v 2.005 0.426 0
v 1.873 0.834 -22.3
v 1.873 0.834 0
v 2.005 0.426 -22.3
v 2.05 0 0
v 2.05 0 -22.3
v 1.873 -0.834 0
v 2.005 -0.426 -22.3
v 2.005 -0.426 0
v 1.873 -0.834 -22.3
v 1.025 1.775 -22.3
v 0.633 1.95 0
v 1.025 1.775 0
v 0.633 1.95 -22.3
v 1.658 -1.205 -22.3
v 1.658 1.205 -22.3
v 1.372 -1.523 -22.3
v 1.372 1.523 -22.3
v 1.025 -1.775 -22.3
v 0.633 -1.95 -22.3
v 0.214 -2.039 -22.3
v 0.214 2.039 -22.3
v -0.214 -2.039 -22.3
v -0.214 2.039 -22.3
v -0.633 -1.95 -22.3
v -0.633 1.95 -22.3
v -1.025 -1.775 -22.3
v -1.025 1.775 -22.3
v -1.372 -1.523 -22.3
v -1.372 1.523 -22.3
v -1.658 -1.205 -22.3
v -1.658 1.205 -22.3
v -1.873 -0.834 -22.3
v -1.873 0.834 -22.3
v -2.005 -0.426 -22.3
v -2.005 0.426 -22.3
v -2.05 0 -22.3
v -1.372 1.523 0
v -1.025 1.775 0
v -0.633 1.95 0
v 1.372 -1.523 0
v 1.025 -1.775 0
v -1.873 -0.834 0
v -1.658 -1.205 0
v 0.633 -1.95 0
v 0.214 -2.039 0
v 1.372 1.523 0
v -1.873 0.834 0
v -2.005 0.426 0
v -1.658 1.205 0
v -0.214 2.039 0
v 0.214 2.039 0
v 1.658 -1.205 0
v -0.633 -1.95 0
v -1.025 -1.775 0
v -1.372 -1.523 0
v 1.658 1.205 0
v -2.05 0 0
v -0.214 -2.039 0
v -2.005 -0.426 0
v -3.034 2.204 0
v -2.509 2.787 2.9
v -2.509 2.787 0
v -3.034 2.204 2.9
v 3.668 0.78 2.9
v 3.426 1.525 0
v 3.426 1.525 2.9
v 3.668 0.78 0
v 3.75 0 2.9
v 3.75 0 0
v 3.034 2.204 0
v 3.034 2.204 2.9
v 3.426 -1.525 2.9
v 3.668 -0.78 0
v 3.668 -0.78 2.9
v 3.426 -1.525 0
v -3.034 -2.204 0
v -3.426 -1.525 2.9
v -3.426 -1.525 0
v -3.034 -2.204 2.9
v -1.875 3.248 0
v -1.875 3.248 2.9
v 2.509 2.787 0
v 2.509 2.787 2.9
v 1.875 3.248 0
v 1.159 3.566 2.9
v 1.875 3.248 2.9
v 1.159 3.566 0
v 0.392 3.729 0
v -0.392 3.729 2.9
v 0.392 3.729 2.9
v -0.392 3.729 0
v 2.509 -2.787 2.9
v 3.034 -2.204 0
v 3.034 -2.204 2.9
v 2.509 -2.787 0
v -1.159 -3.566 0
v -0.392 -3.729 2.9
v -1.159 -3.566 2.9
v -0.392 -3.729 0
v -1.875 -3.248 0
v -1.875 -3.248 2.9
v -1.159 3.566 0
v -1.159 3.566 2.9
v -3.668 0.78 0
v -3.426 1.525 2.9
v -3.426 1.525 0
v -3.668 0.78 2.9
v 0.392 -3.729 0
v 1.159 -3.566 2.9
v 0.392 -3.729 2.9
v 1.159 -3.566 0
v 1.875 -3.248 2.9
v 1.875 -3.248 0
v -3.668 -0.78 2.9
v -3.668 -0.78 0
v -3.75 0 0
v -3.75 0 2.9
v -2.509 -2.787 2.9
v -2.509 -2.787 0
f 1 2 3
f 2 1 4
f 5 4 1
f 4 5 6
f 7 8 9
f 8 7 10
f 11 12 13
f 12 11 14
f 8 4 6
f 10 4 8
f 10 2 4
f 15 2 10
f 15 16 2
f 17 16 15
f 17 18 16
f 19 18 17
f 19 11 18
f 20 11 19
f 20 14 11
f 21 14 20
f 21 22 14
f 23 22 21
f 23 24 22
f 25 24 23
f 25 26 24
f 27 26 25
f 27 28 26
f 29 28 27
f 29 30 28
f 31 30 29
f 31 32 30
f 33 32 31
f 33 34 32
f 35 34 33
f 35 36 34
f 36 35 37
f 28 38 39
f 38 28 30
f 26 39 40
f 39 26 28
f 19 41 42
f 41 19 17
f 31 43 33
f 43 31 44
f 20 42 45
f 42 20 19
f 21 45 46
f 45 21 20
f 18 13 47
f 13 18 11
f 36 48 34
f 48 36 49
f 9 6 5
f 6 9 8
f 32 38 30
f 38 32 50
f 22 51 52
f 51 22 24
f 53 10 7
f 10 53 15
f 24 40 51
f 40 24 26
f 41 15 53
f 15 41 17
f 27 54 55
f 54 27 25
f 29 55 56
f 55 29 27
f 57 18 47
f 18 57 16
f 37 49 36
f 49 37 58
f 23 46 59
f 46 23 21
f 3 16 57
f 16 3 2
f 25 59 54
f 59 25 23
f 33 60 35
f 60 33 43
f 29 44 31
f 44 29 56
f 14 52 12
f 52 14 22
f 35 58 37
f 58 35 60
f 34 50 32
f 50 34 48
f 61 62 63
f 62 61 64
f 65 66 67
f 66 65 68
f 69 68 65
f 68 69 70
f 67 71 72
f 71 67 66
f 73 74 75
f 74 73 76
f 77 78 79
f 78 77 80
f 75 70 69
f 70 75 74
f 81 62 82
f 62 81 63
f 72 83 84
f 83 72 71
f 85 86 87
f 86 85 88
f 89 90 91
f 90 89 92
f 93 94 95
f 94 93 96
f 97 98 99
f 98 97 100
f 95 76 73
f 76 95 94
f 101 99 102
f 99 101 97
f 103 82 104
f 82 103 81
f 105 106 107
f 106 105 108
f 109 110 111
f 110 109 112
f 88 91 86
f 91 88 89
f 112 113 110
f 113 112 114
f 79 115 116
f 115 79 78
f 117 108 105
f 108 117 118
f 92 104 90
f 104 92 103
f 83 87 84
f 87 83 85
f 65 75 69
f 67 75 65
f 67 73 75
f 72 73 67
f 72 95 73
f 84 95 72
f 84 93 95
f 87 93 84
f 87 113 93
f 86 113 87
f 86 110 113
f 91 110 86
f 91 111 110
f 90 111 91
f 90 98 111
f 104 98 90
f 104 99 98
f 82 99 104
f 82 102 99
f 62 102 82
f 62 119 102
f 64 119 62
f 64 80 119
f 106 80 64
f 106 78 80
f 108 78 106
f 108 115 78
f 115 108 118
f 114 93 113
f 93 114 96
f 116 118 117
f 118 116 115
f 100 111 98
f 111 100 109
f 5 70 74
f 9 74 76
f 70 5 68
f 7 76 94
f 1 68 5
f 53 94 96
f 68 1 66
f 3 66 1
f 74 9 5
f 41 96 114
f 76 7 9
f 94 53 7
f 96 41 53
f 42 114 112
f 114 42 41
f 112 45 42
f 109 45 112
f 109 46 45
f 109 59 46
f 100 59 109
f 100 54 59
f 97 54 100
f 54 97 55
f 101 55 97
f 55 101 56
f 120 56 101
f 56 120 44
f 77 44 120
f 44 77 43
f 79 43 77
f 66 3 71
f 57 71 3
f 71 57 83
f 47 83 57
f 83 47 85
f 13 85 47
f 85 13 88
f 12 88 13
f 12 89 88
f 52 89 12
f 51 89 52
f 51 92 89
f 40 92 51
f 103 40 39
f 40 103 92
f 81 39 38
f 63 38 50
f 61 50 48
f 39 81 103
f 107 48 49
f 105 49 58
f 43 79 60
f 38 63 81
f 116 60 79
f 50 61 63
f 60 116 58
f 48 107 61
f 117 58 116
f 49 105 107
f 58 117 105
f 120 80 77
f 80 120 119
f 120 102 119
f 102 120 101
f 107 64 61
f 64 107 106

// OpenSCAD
//This is modelling a plastic screw being used as a bolt, and it's got a thicker bit so that it can slide through one side of the grip and then grab onto the other

function HiLoBoltOuterDiameter(3dPrinterTolerance=.4) = 4.5 + 3dPrinterTolerance*2;
function HiLoBoltDiameter(3dPrinterTolerance=.4)= 3.3 + 3dPrinterTolerance*2;
function HiLoBoltLength(3dPrinterTolerance=.4)= 22 + 3dPrinterTolerance;
function HiLoBoltHeadDiameter(3dPrinterTolerance=.4)= 6.7 + 3dPrinterTolerance*2;
function HiLoBoltHeadHeight(3dPrinterTolerance=.4)= 2.5 + 3dPrinterTolerance;
function HiLoBoltDiameterLooseFit(3dPrinterTolerance=.4)= 4.1 + 3dPrinterTolerance*2;

//err on the side of larger tolerances for bolts

module HiLoBolt(3dPrinterTolerance=.4, PlasticWidth=4.2,looseFit=false)
{
	union()
	{
		translate([0,0,-HiLoBoltLength(3dPrinterTolerance)])
		{
			translate([0,0,.1])
				union()
				{
					if(looseFit){
						cylinder(h=HiLoBoltLength(3dPrinterTolerance), r=HiLoBoltOuterDiameter(3dPrinterTolerance)/2, $fn=30);
					}else{
						cylinder(h=HiLoBoltLength(3dPrinterTolerance), r=HiLoBoltDiameter(3dPrinterTolerance)/2, $fn=30);
					}
//					translate([0,0,HiLoBoltLength(3dPrinterTolerance)-(PlasticWidth+2)])
//					{
//						cylinder(h=PlasticWidth+2, r=HiLoBoltOuterDiameter(3dPrinterTolerance)/2, $fn=30);
//					}
				}
		}
		
		cylinder(h=HiLoBoltHeadHeight(3dPrinterTolerance), r=HiLoBoltHeadDiameter(3dPrinterTolerance)/2,$fn=30);
	}
}



HiLoBolt(.4,4.2);
